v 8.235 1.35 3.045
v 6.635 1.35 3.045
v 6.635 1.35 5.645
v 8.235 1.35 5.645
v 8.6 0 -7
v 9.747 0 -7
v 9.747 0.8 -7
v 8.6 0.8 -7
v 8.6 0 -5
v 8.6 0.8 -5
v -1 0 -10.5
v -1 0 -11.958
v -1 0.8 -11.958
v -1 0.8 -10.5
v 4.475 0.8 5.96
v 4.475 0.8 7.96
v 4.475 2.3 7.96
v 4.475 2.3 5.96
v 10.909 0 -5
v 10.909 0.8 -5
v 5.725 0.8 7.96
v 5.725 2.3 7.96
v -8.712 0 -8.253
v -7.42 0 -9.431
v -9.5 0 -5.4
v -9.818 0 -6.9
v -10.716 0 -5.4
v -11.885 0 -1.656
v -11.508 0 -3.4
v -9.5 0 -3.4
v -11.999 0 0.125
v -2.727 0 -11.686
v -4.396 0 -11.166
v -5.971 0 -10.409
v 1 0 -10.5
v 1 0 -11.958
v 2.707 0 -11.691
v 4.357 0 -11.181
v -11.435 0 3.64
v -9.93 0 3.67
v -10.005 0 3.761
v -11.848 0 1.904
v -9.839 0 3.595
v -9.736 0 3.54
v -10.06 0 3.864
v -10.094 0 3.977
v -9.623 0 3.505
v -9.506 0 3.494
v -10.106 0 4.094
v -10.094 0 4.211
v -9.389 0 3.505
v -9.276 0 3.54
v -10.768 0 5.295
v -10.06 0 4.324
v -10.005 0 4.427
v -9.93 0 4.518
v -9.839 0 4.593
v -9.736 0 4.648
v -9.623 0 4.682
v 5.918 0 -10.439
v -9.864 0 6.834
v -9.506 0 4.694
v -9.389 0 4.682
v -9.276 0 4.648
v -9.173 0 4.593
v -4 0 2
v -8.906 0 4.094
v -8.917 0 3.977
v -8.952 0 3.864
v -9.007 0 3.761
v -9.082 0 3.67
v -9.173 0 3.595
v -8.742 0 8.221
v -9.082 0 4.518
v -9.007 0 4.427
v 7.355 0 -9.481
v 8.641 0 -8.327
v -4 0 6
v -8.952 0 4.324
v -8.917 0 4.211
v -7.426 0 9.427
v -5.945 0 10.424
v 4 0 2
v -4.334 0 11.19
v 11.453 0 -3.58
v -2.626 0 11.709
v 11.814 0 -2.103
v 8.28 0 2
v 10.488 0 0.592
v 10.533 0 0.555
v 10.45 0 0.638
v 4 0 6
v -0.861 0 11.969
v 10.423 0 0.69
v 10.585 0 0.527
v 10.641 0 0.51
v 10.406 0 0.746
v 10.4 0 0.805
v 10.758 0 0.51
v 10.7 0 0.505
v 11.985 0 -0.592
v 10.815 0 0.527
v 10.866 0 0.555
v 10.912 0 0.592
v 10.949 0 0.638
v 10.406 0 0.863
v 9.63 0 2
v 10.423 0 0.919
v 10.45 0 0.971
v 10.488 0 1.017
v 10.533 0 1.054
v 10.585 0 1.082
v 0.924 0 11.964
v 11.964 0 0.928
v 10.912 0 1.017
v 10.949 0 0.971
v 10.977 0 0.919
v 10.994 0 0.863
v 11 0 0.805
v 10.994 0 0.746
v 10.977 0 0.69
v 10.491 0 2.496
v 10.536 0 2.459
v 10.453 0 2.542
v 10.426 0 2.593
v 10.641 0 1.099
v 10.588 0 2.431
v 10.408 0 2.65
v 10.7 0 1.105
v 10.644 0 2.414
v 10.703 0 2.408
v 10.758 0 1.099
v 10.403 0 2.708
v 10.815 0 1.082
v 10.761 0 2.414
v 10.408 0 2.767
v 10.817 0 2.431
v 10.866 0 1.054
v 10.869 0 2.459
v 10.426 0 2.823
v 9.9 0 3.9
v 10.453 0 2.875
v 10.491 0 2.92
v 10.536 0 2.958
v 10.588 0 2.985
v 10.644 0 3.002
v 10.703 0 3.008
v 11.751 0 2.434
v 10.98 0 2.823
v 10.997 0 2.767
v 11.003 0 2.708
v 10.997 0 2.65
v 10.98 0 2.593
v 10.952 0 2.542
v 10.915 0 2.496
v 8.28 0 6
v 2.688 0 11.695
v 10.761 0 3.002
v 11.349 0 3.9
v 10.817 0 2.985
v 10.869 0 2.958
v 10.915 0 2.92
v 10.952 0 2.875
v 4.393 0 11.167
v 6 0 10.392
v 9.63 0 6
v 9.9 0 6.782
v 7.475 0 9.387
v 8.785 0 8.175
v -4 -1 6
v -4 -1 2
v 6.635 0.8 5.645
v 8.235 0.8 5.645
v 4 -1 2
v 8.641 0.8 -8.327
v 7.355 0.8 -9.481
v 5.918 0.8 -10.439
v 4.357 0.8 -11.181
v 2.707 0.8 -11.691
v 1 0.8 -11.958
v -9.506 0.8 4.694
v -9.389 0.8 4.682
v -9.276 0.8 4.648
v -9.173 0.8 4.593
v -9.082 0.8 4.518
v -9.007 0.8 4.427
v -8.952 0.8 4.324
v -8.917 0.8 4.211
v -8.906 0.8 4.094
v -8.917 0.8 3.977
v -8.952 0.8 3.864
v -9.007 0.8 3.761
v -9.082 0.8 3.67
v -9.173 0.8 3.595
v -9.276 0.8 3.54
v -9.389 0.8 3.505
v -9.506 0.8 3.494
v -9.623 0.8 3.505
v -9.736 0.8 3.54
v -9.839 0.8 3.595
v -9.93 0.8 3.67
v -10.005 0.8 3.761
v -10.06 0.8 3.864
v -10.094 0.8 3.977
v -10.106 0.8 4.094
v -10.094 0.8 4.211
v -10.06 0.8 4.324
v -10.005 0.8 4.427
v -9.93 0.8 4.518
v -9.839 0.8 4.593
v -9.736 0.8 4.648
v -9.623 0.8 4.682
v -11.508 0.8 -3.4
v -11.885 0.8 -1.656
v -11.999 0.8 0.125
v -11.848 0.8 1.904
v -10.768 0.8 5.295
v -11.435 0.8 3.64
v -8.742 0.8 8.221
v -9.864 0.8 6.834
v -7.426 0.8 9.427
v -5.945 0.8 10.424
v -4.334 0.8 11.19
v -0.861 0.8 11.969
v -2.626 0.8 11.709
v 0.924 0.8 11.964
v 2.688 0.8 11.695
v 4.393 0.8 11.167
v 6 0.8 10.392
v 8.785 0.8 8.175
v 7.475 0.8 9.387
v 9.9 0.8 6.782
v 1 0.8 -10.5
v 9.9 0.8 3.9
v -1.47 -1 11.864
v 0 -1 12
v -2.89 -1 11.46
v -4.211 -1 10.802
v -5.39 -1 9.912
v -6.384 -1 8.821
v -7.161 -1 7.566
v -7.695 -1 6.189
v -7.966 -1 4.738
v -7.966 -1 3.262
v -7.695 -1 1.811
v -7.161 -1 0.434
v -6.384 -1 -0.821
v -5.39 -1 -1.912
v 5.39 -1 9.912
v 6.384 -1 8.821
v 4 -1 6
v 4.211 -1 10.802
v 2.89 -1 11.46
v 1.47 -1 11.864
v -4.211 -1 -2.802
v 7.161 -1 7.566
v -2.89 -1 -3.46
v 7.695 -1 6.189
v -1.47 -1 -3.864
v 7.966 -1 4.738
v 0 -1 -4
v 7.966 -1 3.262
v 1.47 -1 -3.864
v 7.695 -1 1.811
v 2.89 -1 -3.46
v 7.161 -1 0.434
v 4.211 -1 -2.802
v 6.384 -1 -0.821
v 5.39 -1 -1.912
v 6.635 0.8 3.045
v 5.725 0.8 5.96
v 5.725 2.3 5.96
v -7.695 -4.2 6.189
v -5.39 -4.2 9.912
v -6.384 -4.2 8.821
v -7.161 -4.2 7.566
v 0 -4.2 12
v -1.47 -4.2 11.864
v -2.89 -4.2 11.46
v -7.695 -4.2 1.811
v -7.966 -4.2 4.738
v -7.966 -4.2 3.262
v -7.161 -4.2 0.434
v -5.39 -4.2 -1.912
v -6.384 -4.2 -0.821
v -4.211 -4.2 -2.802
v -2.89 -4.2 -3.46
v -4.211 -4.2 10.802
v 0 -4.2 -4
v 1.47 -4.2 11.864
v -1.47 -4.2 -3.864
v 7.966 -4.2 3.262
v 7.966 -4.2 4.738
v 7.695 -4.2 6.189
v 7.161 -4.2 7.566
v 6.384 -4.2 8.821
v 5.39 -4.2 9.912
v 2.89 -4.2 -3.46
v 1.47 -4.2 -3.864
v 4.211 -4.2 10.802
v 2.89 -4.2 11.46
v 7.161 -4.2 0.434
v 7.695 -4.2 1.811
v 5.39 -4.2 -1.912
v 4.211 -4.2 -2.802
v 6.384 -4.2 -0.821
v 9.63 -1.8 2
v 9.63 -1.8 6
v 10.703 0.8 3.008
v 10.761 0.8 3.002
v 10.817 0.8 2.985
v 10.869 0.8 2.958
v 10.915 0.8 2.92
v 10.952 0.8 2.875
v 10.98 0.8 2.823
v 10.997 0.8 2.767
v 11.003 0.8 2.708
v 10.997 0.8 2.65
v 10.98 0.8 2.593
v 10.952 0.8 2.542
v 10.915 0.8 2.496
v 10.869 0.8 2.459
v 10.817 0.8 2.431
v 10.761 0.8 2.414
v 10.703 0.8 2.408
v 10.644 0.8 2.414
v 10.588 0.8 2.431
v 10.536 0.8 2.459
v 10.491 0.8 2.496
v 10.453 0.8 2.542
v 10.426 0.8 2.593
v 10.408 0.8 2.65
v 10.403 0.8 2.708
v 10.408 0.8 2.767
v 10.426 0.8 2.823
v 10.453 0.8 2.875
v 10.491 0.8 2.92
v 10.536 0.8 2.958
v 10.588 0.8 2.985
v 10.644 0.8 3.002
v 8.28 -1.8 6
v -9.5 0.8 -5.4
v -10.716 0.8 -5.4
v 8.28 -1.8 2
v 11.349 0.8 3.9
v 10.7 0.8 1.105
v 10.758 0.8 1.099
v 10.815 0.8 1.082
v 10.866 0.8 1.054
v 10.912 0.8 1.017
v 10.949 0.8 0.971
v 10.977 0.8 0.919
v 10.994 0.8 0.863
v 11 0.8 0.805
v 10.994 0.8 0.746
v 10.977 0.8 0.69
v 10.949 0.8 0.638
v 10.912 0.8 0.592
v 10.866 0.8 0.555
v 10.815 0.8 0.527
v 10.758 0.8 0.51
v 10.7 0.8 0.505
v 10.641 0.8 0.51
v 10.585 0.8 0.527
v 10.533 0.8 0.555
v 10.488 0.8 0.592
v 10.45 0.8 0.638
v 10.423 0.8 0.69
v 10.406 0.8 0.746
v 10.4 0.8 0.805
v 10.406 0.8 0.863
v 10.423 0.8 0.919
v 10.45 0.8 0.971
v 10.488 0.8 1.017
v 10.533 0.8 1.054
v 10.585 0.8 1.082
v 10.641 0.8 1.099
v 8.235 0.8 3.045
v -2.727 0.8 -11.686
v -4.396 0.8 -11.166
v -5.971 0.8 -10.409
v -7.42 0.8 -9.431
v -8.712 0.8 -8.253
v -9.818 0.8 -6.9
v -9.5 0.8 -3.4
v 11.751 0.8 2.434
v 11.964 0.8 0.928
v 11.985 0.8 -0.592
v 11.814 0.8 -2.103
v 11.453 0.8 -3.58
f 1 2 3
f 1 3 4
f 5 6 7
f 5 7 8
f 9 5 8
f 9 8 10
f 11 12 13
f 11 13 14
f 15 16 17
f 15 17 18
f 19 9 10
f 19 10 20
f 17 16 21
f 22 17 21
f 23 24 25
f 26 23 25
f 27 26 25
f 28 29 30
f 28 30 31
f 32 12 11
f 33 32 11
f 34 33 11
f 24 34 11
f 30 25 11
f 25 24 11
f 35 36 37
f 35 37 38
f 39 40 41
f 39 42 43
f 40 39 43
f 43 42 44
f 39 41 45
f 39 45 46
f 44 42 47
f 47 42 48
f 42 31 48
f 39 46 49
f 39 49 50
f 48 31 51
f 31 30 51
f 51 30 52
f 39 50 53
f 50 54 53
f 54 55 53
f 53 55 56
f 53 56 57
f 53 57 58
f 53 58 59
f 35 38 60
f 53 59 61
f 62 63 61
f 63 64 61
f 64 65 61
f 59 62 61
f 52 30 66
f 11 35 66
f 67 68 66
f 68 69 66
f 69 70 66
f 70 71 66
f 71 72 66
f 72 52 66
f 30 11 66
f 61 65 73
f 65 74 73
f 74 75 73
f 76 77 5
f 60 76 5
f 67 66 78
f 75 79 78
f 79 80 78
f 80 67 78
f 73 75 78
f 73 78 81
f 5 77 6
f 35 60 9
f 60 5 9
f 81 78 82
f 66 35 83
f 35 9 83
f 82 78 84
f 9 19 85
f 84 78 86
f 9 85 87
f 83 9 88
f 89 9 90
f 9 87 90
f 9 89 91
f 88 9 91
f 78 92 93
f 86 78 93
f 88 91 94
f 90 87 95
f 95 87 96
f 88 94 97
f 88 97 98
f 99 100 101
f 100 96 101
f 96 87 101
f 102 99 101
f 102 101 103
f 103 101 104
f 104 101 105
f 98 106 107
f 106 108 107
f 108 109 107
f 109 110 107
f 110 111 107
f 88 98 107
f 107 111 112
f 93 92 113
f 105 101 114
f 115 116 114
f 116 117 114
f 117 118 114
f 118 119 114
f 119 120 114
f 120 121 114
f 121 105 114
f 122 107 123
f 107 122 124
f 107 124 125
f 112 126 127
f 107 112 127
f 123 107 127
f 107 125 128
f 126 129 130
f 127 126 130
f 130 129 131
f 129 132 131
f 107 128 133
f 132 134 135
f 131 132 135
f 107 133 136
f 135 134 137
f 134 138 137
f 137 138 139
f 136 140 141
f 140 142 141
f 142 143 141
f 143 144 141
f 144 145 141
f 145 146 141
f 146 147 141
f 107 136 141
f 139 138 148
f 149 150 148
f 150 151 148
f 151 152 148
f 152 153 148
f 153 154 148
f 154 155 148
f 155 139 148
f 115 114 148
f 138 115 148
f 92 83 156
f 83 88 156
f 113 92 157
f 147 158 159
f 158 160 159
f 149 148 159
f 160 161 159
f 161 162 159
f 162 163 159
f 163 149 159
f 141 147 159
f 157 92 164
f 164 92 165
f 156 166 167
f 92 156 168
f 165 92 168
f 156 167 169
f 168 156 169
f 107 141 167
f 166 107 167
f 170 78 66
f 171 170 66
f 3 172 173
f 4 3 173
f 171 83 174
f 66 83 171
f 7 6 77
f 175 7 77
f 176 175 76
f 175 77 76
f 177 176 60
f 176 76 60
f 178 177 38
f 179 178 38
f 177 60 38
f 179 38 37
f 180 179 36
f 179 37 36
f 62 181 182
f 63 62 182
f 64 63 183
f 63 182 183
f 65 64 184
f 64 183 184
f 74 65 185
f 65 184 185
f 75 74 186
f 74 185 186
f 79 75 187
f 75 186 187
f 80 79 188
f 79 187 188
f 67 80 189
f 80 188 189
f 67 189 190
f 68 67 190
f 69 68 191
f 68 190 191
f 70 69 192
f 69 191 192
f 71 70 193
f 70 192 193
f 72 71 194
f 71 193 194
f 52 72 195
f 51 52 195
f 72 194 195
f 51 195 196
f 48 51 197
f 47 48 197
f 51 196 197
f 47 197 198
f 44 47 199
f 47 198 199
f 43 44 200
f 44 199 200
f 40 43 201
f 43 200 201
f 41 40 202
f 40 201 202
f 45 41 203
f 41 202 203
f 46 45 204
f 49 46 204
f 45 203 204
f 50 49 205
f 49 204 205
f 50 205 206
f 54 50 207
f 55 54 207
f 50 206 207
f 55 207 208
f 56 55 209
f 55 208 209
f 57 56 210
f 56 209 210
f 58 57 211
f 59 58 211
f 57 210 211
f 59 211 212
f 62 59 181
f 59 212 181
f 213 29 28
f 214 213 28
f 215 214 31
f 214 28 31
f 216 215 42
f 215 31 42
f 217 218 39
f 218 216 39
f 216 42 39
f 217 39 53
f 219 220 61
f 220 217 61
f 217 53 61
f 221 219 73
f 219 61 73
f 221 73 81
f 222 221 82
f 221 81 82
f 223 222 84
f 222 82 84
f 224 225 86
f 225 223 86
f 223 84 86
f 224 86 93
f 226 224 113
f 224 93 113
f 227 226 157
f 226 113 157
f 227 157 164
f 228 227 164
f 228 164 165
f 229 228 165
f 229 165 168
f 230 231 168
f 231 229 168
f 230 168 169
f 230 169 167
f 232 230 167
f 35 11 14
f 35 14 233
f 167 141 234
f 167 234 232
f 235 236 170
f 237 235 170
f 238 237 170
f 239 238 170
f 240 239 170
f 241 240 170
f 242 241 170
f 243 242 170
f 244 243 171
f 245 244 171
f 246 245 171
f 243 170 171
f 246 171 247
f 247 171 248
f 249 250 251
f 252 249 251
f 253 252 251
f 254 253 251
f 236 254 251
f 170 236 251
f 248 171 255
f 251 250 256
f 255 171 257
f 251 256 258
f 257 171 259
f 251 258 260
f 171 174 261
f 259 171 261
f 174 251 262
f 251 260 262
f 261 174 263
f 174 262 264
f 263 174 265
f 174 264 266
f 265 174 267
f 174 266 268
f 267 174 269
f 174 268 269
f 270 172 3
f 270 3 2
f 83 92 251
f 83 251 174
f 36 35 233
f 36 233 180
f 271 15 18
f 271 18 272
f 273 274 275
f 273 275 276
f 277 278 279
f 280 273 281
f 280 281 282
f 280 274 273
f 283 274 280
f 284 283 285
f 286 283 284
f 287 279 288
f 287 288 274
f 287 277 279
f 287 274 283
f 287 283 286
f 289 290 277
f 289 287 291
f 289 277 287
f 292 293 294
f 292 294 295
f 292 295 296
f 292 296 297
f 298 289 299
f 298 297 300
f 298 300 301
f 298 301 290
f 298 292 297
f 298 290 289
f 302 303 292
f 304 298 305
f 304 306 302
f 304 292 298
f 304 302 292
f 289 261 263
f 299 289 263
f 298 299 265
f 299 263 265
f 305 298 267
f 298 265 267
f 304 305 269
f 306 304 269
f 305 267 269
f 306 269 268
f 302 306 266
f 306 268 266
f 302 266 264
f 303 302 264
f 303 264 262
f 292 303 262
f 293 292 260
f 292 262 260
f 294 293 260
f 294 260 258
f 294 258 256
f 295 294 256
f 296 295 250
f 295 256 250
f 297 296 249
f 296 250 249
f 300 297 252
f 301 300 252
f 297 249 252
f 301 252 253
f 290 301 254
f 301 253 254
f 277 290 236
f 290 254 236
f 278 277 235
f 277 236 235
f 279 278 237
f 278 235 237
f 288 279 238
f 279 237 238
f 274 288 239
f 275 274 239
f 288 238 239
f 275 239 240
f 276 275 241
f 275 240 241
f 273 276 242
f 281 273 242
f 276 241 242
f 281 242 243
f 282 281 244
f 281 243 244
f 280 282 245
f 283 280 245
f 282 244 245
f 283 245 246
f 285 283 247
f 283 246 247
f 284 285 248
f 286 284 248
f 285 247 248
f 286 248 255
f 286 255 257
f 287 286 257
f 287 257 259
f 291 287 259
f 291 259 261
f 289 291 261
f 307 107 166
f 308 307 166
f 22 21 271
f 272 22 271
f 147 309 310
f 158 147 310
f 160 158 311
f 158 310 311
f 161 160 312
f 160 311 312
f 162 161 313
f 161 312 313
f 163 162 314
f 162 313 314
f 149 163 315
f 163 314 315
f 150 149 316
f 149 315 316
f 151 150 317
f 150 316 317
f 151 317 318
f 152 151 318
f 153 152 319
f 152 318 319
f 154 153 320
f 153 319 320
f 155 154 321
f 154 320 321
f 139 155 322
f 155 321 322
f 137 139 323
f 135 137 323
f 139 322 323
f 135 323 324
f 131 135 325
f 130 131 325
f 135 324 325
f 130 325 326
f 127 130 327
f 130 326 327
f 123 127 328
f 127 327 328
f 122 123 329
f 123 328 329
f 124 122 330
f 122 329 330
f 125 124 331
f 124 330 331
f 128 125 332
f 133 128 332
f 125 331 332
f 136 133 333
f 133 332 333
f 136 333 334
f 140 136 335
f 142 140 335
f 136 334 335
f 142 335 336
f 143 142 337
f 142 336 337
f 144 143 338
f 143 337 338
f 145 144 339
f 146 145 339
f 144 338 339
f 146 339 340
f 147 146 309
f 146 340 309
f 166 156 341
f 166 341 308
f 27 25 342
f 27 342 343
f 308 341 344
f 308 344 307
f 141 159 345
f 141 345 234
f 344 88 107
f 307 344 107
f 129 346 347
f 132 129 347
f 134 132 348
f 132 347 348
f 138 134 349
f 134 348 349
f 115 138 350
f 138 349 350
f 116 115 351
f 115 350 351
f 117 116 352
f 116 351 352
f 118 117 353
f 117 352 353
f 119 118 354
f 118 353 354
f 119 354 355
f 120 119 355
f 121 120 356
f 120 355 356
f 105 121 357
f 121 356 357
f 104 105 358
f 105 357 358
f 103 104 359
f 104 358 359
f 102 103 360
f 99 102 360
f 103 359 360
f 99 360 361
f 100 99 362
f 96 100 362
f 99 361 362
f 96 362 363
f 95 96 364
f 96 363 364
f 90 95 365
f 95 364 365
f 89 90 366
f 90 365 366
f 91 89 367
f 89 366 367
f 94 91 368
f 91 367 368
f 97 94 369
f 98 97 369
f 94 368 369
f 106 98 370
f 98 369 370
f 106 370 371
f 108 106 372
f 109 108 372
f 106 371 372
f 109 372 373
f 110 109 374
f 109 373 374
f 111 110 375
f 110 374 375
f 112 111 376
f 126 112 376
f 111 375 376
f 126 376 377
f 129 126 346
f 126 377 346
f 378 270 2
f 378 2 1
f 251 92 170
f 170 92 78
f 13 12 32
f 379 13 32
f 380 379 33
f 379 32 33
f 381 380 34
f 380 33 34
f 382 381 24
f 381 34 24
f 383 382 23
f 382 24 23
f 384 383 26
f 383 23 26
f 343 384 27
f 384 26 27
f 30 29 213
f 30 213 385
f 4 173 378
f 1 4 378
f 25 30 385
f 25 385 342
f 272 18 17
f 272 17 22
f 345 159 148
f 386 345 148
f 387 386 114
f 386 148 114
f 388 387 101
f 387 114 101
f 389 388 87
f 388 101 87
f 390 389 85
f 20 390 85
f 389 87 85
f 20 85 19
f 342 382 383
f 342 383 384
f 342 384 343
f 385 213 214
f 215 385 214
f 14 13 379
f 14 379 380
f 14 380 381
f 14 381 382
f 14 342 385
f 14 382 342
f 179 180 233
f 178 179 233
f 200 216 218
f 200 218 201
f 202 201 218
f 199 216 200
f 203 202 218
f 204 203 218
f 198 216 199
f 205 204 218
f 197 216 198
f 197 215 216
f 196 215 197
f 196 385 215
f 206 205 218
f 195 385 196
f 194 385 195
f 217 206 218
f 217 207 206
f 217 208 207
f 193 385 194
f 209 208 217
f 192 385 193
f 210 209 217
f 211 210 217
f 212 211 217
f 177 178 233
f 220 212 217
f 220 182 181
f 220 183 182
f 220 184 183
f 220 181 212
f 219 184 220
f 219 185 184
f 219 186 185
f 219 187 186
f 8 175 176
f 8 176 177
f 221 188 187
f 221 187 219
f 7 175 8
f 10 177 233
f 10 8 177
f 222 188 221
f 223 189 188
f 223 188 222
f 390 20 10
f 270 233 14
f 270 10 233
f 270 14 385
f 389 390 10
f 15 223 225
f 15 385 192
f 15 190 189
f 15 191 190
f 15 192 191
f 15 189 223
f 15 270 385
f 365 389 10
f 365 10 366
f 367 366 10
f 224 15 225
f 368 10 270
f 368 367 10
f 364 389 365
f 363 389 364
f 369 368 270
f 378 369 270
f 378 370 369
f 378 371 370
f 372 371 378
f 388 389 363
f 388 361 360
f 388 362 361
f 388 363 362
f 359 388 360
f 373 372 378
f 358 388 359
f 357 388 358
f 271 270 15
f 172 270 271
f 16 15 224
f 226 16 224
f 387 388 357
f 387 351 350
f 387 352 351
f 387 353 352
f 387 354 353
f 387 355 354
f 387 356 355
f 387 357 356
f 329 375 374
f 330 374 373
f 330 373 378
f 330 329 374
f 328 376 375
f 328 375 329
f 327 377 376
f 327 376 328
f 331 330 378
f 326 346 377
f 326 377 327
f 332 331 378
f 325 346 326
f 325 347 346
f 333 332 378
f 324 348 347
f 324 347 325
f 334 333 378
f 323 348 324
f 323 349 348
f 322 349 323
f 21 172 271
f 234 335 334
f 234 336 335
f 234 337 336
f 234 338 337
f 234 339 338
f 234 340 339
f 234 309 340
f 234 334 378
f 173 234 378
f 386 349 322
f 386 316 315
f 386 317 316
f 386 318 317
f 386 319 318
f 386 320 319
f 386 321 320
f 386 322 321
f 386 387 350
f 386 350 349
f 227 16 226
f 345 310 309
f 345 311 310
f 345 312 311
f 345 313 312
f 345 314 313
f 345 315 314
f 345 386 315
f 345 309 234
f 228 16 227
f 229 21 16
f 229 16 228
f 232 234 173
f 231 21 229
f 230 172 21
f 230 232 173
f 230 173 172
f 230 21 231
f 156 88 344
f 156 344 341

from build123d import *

# Parameters (mm, degrees)
SKETCH1_R           = 12
BOSS_EXTRUDE1_DEPTH = 0.8
CUT_EXTRUDE1_START  = -0.8
CUT_EXTRUDE1_DEPTH  = 0.8
SKETCH3_R           = 0.6
SKETCH3_R_2         = 0.3
CUT_EXTRUDE2_DEPTH  = 0.8
SKETCH4_W           = 8
SKETCH4_H           = 4
BOSS_EXTRUDE2_DEPTH = 1
SKETCH5_R           = 8
BOSS_EXTRUDE3_DEPTH = 3.2
SKETCH6_W           = 1.35
SKETCH6_H           = 4
BOSS_EXTRUDE4_DEPTH = 1.8
SKETCH7_W           = 1.25
SKETCH7_H           = 2
BOSS_EXTRUDE5_DEPTH = 1.5
SKETCH8_W           = 1.6
SKETCH8_H           = 2.6
BOSS_EXTRUDE6_DEPTH = 0.55


with BuildPart() as part:
    # Sketch1 → Boss-Extrude1 (new body)
    with BuildSketch(Plane(origin=(0, 0, 0), x_dir=(1, 0, 0), z_dir=(0, 1, 0))):
        with Locations(Location((0, 0, 0), (0, 0, 270))):
            Circle(SKETCH1_R)
    extrude(amount=BOSS_EXTRUDE1_DEPTH)

    # Sketch2 → Cut-Extrude1 (cut)
    with BuildSketch(Plane(origin=(0, 0.8, 0), x_dir=(1, 0, 0), z_dir=(0, 1, 0)).offset(CUT_EXTRUDE1_START)):
        with BuildLine():
            Line((-11.508257905, 3.4), (-9.5, 3.4))
            Line((-9.5, 3.4), (-9.5, 5.4))
            Line((-9.5, 5.4), (-10.71634266, 5.4))
            ThreePointArc((-10.71634266, 5.4), (-11.157204738, 4.417780261), (-11.508257905, 3.4))
        make_face()
        with BuildLine():
            ThreePointArc((0, 12), (-0.500435352, 11.989560645), (-1, 11.958260743))
            Line((-1, 11.958260743), (-1, 10.5))
            Line((-1, 10.5), (1, 10.5))
            Line((1, 10.5), (1, 11.958260743))
            ThreePointArc((1, 11.958260743), (0.500435352, 11.989560645), (0, 12))
        make_face()
        with BuildLine():
            Line((8.6, 5), (10.908712115, 5))
            ThreePointArc((10.908712115, 5), (10.376053526, 6.028060486), (9.746794345, 7))
            Line((9.746794345, 7), (8.6, 7))
            Line((8.6, 7), (8.6, 5))
        make_face()
        with BuildLine():
            Line((9.9, -3.9), (9.9, -6.781592733))
            ThreePointArc((9.9, -6.781592733), (10.721534718, -5.389683969), (11.348568192, -3.9))
            Line((11.348568192, -3.9), (9.9, -3.9))
        make_face()
    extrude(amount=CUT_EXTRUDE1_DEPTH, mode=Mode.SUBTRACT)

    # Sketch3 → Cut-Extrude2 (cut)
    with BuildSketch(Plane(origin=(0, 0.8, 0), x_dir=(1, 0, 0), z_dir=(0, 1, 0))):
        with Locations(Location((-9.505920047, -4.093895952, 0), (0, 0, 270))):
            Circle(SKETCH3_R)
        with Locations(Location((10.702676663, -2.70819354, 0), (0, 0, 270))):
            Circle(SKETCH3_R_2)
        with Locations(Location((10.699796483, -0.804521739, 0), (0, 0, 270))):
            Circle(SKETCH3_R_2)
    extrude(amount=-CUT_EXTRUDE2_DEPTH, mode=Mode.SUBTRACT)

    # Sketch4 → Boss-Extrude2 (add)
    with BuildSketch(Plane(origin=(0, 0, 0), x_dir=(-1, 0, 0), z_dir=(0, -1, 0))):
        with Locations((0, -4)):
            Rectangle(SKETCH4_W, SKETCH4_H)
    extrude(amount=BOSS_EXTRUDE2_DEPTH)

    # Sketch5 → Boss-Extrude3 (add)
    with BuildSketch(Plane(origin=(0, -1, 0), x_dir=(-1, 0, 0), z_dir=(0, -1, 0))):
        with Locations(Location((0, -4, 0), (0, 0, 90))):
            Circle(SKETCH5_R)
    extrude(amount=BOSS_EXTRUDE3_DEPTH)

    # Sketch6 → Boss-Extrude4 (add)
    with BuildSketch(Plane.XZ):
        with Locations((8.955, 4)):
            Rectangle(SKETCH6_W, SKETCH6_H)
    extrude(amount=BOSS_EXTRUDE4_DEPTH)

    # Sketch7 → Boss-Extrude5 (add)
    with BuildSketch(Plane(origin=(0, 0.8, 0), x_dir=(1, 0, 0), z_dir=(0, 1, 0))):
        with Locations((5.1, -6.96)):
            Rectangle(SKETCH7_W, SKETCH7_H)
    extrude(amount=BOSS_EXTRUDE5_DEPTH)

    # Sketch8 → Boss-Extrude6 (add)
    with BuildSketch(Plane(origin=(0, 0.8, 0), x_dir=(1, 0, 0), z_dir=(0, 1, 0))):
        with Locations((7.435, -4.345)):
            Rectangle(SKETCH8_W, SKETCH8_H)
    extrude(amount=BOSS_EXTRUDE6_DEPTH)


solid = part.part
